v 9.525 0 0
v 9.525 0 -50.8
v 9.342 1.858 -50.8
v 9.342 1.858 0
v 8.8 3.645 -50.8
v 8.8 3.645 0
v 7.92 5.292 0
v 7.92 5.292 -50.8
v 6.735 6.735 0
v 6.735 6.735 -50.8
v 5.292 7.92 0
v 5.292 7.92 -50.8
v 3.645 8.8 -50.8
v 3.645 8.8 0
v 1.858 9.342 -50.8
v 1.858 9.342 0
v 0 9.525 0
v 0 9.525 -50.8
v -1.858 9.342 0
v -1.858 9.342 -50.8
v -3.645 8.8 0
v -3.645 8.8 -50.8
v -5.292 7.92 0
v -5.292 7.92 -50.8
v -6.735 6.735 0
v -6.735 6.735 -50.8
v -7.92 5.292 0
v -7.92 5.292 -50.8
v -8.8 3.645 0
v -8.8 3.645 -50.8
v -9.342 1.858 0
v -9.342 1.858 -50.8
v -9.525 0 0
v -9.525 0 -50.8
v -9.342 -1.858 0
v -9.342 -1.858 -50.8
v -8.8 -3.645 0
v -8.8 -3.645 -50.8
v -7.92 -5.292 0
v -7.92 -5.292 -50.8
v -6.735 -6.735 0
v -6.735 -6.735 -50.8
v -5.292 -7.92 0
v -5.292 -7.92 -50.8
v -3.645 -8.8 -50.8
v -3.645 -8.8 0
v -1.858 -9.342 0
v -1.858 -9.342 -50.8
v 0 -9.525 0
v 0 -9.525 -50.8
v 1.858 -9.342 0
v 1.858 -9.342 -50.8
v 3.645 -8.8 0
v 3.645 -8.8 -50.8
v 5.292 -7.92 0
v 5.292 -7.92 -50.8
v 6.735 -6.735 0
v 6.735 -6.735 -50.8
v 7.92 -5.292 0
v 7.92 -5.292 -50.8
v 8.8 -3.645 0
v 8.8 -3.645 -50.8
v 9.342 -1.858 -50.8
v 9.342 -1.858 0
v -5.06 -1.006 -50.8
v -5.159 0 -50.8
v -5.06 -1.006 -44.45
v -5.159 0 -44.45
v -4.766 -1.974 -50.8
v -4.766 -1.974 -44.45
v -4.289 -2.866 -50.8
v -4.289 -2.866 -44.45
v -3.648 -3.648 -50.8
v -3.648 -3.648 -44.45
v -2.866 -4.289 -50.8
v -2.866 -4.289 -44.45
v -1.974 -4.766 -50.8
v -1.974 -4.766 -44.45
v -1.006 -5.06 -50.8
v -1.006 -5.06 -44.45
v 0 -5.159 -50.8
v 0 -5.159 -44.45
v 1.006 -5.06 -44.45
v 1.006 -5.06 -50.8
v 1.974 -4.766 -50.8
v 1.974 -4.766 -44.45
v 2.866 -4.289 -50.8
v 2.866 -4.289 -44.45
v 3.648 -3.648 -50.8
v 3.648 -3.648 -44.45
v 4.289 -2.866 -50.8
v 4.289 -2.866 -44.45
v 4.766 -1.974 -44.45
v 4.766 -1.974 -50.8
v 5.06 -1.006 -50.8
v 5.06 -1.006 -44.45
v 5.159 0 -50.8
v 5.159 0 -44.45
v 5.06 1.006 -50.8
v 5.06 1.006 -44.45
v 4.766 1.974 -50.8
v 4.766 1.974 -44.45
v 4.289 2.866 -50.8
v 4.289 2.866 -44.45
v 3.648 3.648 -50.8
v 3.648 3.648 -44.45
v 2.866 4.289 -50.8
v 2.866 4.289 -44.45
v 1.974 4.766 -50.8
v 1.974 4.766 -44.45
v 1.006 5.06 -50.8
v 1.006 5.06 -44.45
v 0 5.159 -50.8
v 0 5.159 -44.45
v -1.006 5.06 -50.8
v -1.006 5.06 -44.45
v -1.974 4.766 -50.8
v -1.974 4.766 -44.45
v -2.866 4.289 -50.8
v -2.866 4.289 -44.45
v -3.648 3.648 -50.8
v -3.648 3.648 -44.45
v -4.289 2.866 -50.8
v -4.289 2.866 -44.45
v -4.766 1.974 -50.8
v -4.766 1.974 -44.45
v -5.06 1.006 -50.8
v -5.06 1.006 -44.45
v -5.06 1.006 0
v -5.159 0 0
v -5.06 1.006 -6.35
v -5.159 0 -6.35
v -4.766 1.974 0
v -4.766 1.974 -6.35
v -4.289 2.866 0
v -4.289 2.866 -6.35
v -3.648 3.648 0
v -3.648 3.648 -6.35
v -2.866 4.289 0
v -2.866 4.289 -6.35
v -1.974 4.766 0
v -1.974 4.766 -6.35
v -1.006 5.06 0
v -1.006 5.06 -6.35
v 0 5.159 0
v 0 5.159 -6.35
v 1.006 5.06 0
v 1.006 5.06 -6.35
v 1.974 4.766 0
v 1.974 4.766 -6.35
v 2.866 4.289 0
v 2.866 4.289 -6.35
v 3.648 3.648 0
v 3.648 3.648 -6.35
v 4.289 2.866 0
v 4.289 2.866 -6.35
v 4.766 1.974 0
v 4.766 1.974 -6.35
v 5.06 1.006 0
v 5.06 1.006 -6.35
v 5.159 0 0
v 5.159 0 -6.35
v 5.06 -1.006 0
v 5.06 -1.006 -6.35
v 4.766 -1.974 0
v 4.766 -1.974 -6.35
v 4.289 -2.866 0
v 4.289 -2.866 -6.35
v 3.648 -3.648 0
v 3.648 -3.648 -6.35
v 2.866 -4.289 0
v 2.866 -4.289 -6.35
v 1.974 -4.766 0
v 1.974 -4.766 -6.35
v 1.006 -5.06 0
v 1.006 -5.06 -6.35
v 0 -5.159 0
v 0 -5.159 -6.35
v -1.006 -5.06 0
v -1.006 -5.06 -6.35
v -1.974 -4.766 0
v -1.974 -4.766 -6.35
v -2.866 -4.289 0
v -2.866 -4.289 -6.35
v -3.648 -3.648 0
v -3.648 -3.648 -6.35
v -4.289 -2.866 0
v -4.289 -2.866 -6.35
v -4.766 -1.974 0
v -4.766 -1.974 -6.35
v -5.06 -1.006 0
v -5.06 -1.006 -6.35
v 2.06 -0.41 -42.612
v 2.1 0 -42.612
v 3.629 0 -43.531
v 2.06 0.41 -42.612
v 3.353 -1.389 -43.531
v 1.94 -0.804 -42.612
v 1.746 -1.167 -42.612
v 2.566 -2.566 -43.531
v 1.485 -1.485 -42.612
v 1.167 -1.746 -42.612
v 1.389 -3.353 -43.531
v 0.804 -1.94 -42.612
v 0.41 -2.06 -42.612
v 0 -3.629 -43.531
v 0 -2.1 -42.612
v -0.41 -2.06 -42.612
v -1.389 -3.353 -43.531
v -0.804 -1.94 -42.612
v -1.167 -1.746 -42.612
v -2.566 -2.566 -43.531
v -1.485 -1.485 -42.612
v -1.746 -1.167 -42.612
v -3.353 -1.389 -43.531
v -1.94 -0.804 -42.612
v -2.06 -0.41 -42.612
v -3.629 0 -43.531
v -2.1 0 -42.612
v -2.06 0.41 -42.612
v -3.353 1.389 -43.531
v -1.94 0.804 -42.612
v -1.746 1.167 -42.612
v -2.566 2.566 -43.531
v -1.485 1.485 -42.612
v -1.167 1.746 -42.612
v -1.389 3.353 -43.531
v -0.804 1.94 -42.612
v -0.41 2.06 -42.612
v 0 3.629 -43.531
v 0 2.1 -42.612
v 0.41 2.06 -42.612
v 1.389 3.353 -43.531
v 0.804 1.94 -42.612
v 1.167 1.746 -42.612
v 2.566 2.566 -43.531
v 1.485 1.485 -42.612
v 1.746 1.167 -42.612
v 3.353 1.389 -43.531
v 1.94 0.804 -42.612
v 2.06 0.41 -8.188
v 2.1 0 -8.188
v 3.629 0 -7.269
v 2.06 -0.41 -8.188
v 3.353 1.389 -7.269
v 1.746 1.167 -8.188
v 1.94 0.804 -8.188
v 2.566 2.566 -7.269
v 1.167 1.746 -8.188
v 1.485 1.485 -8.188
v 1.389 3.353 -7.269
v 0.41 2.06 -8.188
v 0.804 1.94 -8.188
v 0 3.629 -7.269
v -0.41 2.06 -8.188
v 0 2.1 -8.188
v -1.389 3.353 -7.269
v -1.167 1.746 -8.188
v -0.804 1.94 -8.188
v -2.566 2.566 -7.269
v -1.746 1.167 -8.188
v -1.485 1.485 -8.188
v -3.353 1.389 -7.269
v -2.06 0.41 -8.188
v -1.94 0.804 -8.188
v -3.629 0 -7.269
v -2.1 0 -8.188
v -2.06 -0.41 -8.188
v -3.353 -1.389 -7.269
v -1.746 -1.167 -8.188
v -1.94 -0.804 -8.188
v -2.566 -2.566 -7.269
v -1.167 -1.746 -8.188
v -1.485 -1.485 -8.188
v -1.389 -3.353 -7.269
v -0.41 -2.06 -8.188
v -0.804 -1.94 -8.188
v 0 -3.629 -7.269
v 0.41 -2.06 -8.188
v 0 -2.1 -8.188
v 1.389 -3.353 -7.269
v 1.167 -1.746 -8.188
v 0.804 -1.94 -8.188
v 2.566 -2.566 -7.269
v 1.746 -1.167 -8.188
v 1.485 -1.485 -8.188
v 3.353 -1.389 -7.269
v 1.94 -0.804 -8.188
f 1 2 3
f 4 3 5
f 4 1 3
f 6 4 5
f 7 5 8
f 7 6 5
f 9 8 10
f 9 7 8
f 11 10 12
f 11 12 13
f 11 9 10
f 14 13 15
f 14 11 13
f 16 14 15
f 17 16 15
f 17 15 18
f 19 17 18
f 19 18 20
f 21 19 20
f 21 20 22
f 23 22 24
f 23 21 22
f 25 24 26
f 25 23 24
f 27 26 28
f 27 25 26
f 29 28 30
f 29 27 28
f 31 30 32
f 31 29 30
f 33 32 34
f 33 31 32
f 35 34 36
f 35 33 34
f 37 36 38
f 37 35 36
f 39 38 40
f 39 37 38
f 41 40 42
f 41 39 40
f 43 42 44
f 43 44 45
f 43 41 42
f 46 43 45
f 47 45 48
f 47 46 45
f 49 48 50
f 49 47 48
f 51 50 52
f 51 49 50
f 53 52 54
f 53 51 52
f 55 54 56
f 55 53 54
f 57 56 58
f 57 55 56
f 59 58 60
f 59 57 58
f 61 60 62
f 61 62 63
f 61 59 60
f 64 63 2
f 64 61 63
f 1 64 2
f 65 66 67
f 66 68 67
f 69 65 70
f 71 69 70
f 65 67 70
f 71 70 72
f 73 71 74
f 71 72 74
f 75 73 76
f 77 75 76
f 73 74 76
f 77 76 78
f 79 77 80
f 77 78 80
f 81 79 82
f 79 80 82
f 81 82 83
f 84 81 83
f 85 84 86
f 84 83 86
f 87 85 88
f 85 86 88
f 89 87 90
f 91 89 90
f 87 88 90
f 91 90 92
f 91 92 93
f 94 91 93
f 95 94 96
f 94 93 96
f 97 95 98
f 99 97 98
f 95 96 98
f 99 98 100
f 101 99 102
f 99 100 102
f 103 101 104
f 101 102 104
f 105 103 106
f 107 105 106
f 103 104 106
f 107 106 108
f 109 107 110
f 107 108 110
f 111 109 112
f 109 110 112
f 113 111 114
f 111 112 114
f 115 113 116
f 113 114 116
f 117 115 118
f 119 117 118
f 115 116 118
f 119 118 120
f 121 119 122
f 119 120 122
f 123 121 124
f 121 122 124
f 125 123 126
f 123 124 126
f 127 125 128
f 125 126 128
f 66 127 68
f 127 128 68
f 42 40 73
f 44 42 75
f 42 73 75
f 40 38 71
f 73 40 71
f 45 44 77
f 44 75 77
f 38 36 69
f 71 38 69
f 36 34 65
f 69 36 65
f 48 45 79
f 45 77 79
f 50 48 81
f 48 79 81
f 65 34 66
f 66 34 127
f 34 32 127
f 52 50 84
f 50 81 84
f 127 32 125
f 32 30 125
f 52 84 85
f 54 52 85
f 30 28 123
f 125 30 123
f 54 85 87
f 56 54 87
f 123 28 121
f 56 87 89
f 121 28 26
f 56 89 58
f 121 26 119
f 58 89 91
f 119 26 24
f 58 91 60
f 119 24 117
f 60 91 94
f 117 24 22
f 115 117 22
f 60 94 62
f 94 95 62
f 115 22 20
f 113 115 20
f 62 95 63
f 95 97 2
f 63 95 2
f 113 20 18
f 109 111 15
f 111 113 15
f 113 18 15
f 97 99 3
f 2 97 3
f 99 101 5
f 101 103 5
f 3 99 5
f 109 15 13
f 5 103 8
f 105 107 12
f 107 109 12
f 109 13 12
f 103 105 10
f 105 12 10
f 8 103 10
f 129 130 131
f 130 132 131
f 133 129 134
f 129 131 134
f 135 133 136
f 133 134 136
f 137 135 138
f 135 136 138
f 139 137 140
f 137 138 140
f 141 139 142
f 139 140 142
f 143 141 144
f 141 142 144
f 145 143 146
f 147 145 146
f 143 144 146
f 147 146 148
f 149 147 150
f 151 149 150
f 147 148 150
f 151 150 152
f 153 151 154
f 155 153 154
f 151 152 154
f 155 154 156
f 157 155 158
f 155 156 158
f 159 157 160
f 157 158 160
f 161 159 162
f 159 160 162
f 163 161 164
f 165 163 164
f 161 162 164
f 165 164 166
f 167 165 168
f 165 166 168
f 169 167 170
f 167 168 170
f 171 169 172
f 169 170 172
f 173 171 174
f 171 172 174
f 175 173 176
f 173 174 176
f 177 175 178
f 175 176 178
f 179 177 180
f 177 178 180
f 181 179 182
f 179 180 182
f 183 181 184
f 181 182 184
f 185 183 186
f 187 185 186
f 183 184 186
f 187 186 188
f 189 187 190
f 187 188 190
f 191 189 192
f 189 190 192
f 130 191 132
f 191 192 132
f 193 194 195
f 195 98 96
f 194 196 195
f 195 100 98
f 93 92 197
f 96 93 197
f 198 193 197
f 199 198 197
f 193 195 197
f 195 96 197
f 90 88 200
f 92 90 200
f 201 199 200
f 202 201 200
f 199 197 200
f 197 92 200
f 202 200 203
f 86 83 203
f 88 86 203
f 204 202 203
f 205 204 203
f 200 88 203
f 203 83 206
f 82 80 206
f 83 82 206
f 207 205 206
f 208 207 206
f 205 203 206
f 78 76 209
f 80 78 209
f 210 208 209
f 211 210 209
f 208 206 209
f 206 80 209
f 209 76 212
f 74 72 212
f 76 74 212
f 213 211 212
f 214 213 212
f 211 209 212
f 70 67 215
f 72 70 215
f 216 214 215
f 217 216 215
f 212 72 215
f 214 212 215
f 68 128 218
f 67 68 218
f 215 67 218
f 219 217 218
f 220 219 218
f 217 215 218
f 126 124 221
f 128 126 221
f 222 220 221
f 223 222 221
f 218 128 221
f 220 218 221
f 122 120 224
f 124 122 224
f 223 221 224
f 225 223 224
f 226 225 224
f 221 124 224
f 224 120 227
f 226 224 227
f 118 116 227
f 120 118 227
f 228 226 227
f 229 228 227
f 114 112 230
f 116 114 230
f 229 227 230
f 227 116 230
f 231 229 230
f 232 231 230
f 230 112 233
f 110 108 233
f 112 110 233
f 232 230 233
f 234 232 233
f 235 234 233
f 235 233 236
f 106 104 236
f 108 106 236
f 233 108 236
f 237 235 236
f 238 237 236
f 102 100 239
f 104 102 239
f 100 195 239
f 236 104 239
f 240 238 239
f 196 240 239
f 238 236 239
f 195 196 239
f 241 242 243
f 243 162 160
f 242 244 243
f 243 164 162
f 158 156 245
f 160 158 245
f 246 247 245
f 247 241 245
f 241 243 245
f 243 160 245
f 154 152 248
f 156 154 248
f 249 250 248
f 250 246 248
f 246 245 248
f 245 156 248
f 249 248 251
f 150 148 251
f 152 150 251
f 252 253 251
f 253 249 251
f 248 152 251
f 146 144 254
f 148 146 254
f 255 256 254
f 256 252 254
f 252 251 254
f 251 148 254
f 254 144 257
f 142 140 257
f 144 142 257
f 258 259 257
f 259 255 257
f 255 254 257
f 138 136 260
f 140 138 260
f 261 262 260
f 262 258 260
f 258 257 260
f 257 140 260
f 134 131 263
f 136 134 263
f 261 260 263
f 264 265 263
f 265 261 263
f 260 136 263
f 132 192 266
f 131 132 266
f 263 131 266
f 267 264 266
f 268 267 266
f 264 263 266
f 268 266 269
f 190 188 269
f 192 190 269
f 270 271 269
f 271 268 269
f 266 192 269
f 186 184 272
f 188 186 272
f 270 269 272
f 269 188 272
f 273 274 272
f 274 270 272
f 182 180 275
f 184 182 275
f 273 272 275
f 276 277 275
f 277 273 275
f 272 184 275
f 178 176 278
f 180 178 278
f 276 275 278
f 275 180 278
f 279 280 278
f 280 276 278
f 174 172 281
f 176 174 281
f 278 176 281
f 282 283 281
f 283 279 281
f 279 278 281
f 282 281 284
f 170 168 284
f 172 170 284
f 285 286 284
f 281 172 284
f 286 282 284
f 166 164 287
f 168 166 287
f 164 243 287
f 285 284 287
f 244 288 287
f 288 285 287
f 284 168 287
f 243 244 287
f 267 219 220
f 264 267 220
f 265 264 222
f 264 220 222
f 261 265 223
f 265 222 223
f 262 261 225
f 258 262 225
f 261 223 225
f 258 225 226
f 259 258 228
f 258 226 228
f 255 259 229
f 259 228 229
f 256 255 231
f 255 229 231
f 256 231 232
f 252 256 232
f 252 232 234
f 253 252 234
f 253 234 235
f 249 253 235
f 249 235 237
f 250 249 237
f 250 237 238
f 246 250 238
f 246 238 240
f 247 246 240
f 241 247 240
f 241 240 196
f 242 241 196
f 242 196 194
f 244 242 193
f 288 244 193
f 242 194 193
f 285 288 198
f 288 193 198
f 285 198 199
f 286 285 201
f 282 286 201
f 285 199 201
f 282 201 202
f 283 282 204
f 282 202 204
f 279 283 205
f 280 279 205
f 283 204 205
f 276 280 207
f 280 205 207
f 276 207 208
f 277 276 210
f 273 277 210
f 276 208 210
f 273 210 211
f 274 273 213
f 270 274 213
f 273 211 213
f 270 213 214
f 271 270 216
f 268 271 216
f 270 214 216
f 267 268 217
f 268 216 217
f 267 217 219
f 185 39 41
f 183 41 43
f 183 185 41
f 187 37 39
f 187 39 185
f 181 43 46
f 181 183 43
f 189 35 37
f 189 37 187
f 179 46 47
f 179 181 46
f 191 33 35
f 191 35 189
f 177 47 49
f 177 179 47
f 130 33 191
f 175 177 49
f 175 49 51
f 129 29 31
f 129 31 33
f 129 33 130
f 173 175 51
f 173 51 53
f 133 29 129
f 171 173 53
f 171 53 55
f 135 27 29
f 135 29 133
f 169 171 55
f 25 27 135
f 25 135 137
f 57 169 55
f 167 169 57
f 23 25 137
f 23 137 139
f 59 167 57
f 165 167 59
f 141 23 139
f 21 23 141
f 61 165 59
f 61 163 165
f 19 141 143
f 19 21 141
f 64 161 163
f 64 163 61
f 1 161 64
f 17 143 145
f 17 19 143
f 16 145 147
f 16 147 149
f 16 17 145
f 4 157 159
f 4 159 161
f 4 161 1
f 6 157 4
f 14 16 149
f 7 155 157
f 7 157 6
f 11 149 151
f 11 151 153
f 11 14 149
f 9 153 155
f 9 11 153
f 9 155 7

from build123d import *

# Parameters (mm, degrees)
F1_R     = 9.525
F2_DEPTH = 50.8
F5_D     = 4.2
F6_D     = 10.31748
F6_DEPTH = 6.35
F6_TIP   = 3.0996837098
F8_D     = 10.31748
F8_DEPTH = 6.35
F8_TIP   = 3.0996837098


with BuildPart() as f2:
    # F1 (on Top) → F2 (new body, through all)
    with BuildSketch(Plane.XY):
        Circle(F1_R)
    extrude(amount=-F2_DEPTH)

    # F5 (through all)
    with Locations(Plane.XY):
        with Locations((0, 0)):
            Hole(F5_D / 2)

    # F6
    with Locations(Plane(origin=(0, 0, -50.8), x_dir=(1, 0, 0), z_dir=(0, 0, -1))):
        with Locations((0, 0)):
            Hole(F6_D / 2, depth=F6_DEPTH)
            with Locations((0, 0, -(F6_DEPTH + F6_TIP / 2))):  # 118° drill point
                Cone(0, F6_D / 2, F6_TIP, mode=Mode.SUBTRACT)

    # F8
    with Locations(Plane.XY):
        with Locations((0, 0)):
            Hole(F8_D / 2, depth=F8_DEPTH)
            with Locations((0, 0, -(F8_DEPTH + F8_TIP / 2))):  # 118° drill point
                Cone(0, F8_D / 2, F8_TIP, mode=Mode.SUBTRACT)


solid = f2.part
